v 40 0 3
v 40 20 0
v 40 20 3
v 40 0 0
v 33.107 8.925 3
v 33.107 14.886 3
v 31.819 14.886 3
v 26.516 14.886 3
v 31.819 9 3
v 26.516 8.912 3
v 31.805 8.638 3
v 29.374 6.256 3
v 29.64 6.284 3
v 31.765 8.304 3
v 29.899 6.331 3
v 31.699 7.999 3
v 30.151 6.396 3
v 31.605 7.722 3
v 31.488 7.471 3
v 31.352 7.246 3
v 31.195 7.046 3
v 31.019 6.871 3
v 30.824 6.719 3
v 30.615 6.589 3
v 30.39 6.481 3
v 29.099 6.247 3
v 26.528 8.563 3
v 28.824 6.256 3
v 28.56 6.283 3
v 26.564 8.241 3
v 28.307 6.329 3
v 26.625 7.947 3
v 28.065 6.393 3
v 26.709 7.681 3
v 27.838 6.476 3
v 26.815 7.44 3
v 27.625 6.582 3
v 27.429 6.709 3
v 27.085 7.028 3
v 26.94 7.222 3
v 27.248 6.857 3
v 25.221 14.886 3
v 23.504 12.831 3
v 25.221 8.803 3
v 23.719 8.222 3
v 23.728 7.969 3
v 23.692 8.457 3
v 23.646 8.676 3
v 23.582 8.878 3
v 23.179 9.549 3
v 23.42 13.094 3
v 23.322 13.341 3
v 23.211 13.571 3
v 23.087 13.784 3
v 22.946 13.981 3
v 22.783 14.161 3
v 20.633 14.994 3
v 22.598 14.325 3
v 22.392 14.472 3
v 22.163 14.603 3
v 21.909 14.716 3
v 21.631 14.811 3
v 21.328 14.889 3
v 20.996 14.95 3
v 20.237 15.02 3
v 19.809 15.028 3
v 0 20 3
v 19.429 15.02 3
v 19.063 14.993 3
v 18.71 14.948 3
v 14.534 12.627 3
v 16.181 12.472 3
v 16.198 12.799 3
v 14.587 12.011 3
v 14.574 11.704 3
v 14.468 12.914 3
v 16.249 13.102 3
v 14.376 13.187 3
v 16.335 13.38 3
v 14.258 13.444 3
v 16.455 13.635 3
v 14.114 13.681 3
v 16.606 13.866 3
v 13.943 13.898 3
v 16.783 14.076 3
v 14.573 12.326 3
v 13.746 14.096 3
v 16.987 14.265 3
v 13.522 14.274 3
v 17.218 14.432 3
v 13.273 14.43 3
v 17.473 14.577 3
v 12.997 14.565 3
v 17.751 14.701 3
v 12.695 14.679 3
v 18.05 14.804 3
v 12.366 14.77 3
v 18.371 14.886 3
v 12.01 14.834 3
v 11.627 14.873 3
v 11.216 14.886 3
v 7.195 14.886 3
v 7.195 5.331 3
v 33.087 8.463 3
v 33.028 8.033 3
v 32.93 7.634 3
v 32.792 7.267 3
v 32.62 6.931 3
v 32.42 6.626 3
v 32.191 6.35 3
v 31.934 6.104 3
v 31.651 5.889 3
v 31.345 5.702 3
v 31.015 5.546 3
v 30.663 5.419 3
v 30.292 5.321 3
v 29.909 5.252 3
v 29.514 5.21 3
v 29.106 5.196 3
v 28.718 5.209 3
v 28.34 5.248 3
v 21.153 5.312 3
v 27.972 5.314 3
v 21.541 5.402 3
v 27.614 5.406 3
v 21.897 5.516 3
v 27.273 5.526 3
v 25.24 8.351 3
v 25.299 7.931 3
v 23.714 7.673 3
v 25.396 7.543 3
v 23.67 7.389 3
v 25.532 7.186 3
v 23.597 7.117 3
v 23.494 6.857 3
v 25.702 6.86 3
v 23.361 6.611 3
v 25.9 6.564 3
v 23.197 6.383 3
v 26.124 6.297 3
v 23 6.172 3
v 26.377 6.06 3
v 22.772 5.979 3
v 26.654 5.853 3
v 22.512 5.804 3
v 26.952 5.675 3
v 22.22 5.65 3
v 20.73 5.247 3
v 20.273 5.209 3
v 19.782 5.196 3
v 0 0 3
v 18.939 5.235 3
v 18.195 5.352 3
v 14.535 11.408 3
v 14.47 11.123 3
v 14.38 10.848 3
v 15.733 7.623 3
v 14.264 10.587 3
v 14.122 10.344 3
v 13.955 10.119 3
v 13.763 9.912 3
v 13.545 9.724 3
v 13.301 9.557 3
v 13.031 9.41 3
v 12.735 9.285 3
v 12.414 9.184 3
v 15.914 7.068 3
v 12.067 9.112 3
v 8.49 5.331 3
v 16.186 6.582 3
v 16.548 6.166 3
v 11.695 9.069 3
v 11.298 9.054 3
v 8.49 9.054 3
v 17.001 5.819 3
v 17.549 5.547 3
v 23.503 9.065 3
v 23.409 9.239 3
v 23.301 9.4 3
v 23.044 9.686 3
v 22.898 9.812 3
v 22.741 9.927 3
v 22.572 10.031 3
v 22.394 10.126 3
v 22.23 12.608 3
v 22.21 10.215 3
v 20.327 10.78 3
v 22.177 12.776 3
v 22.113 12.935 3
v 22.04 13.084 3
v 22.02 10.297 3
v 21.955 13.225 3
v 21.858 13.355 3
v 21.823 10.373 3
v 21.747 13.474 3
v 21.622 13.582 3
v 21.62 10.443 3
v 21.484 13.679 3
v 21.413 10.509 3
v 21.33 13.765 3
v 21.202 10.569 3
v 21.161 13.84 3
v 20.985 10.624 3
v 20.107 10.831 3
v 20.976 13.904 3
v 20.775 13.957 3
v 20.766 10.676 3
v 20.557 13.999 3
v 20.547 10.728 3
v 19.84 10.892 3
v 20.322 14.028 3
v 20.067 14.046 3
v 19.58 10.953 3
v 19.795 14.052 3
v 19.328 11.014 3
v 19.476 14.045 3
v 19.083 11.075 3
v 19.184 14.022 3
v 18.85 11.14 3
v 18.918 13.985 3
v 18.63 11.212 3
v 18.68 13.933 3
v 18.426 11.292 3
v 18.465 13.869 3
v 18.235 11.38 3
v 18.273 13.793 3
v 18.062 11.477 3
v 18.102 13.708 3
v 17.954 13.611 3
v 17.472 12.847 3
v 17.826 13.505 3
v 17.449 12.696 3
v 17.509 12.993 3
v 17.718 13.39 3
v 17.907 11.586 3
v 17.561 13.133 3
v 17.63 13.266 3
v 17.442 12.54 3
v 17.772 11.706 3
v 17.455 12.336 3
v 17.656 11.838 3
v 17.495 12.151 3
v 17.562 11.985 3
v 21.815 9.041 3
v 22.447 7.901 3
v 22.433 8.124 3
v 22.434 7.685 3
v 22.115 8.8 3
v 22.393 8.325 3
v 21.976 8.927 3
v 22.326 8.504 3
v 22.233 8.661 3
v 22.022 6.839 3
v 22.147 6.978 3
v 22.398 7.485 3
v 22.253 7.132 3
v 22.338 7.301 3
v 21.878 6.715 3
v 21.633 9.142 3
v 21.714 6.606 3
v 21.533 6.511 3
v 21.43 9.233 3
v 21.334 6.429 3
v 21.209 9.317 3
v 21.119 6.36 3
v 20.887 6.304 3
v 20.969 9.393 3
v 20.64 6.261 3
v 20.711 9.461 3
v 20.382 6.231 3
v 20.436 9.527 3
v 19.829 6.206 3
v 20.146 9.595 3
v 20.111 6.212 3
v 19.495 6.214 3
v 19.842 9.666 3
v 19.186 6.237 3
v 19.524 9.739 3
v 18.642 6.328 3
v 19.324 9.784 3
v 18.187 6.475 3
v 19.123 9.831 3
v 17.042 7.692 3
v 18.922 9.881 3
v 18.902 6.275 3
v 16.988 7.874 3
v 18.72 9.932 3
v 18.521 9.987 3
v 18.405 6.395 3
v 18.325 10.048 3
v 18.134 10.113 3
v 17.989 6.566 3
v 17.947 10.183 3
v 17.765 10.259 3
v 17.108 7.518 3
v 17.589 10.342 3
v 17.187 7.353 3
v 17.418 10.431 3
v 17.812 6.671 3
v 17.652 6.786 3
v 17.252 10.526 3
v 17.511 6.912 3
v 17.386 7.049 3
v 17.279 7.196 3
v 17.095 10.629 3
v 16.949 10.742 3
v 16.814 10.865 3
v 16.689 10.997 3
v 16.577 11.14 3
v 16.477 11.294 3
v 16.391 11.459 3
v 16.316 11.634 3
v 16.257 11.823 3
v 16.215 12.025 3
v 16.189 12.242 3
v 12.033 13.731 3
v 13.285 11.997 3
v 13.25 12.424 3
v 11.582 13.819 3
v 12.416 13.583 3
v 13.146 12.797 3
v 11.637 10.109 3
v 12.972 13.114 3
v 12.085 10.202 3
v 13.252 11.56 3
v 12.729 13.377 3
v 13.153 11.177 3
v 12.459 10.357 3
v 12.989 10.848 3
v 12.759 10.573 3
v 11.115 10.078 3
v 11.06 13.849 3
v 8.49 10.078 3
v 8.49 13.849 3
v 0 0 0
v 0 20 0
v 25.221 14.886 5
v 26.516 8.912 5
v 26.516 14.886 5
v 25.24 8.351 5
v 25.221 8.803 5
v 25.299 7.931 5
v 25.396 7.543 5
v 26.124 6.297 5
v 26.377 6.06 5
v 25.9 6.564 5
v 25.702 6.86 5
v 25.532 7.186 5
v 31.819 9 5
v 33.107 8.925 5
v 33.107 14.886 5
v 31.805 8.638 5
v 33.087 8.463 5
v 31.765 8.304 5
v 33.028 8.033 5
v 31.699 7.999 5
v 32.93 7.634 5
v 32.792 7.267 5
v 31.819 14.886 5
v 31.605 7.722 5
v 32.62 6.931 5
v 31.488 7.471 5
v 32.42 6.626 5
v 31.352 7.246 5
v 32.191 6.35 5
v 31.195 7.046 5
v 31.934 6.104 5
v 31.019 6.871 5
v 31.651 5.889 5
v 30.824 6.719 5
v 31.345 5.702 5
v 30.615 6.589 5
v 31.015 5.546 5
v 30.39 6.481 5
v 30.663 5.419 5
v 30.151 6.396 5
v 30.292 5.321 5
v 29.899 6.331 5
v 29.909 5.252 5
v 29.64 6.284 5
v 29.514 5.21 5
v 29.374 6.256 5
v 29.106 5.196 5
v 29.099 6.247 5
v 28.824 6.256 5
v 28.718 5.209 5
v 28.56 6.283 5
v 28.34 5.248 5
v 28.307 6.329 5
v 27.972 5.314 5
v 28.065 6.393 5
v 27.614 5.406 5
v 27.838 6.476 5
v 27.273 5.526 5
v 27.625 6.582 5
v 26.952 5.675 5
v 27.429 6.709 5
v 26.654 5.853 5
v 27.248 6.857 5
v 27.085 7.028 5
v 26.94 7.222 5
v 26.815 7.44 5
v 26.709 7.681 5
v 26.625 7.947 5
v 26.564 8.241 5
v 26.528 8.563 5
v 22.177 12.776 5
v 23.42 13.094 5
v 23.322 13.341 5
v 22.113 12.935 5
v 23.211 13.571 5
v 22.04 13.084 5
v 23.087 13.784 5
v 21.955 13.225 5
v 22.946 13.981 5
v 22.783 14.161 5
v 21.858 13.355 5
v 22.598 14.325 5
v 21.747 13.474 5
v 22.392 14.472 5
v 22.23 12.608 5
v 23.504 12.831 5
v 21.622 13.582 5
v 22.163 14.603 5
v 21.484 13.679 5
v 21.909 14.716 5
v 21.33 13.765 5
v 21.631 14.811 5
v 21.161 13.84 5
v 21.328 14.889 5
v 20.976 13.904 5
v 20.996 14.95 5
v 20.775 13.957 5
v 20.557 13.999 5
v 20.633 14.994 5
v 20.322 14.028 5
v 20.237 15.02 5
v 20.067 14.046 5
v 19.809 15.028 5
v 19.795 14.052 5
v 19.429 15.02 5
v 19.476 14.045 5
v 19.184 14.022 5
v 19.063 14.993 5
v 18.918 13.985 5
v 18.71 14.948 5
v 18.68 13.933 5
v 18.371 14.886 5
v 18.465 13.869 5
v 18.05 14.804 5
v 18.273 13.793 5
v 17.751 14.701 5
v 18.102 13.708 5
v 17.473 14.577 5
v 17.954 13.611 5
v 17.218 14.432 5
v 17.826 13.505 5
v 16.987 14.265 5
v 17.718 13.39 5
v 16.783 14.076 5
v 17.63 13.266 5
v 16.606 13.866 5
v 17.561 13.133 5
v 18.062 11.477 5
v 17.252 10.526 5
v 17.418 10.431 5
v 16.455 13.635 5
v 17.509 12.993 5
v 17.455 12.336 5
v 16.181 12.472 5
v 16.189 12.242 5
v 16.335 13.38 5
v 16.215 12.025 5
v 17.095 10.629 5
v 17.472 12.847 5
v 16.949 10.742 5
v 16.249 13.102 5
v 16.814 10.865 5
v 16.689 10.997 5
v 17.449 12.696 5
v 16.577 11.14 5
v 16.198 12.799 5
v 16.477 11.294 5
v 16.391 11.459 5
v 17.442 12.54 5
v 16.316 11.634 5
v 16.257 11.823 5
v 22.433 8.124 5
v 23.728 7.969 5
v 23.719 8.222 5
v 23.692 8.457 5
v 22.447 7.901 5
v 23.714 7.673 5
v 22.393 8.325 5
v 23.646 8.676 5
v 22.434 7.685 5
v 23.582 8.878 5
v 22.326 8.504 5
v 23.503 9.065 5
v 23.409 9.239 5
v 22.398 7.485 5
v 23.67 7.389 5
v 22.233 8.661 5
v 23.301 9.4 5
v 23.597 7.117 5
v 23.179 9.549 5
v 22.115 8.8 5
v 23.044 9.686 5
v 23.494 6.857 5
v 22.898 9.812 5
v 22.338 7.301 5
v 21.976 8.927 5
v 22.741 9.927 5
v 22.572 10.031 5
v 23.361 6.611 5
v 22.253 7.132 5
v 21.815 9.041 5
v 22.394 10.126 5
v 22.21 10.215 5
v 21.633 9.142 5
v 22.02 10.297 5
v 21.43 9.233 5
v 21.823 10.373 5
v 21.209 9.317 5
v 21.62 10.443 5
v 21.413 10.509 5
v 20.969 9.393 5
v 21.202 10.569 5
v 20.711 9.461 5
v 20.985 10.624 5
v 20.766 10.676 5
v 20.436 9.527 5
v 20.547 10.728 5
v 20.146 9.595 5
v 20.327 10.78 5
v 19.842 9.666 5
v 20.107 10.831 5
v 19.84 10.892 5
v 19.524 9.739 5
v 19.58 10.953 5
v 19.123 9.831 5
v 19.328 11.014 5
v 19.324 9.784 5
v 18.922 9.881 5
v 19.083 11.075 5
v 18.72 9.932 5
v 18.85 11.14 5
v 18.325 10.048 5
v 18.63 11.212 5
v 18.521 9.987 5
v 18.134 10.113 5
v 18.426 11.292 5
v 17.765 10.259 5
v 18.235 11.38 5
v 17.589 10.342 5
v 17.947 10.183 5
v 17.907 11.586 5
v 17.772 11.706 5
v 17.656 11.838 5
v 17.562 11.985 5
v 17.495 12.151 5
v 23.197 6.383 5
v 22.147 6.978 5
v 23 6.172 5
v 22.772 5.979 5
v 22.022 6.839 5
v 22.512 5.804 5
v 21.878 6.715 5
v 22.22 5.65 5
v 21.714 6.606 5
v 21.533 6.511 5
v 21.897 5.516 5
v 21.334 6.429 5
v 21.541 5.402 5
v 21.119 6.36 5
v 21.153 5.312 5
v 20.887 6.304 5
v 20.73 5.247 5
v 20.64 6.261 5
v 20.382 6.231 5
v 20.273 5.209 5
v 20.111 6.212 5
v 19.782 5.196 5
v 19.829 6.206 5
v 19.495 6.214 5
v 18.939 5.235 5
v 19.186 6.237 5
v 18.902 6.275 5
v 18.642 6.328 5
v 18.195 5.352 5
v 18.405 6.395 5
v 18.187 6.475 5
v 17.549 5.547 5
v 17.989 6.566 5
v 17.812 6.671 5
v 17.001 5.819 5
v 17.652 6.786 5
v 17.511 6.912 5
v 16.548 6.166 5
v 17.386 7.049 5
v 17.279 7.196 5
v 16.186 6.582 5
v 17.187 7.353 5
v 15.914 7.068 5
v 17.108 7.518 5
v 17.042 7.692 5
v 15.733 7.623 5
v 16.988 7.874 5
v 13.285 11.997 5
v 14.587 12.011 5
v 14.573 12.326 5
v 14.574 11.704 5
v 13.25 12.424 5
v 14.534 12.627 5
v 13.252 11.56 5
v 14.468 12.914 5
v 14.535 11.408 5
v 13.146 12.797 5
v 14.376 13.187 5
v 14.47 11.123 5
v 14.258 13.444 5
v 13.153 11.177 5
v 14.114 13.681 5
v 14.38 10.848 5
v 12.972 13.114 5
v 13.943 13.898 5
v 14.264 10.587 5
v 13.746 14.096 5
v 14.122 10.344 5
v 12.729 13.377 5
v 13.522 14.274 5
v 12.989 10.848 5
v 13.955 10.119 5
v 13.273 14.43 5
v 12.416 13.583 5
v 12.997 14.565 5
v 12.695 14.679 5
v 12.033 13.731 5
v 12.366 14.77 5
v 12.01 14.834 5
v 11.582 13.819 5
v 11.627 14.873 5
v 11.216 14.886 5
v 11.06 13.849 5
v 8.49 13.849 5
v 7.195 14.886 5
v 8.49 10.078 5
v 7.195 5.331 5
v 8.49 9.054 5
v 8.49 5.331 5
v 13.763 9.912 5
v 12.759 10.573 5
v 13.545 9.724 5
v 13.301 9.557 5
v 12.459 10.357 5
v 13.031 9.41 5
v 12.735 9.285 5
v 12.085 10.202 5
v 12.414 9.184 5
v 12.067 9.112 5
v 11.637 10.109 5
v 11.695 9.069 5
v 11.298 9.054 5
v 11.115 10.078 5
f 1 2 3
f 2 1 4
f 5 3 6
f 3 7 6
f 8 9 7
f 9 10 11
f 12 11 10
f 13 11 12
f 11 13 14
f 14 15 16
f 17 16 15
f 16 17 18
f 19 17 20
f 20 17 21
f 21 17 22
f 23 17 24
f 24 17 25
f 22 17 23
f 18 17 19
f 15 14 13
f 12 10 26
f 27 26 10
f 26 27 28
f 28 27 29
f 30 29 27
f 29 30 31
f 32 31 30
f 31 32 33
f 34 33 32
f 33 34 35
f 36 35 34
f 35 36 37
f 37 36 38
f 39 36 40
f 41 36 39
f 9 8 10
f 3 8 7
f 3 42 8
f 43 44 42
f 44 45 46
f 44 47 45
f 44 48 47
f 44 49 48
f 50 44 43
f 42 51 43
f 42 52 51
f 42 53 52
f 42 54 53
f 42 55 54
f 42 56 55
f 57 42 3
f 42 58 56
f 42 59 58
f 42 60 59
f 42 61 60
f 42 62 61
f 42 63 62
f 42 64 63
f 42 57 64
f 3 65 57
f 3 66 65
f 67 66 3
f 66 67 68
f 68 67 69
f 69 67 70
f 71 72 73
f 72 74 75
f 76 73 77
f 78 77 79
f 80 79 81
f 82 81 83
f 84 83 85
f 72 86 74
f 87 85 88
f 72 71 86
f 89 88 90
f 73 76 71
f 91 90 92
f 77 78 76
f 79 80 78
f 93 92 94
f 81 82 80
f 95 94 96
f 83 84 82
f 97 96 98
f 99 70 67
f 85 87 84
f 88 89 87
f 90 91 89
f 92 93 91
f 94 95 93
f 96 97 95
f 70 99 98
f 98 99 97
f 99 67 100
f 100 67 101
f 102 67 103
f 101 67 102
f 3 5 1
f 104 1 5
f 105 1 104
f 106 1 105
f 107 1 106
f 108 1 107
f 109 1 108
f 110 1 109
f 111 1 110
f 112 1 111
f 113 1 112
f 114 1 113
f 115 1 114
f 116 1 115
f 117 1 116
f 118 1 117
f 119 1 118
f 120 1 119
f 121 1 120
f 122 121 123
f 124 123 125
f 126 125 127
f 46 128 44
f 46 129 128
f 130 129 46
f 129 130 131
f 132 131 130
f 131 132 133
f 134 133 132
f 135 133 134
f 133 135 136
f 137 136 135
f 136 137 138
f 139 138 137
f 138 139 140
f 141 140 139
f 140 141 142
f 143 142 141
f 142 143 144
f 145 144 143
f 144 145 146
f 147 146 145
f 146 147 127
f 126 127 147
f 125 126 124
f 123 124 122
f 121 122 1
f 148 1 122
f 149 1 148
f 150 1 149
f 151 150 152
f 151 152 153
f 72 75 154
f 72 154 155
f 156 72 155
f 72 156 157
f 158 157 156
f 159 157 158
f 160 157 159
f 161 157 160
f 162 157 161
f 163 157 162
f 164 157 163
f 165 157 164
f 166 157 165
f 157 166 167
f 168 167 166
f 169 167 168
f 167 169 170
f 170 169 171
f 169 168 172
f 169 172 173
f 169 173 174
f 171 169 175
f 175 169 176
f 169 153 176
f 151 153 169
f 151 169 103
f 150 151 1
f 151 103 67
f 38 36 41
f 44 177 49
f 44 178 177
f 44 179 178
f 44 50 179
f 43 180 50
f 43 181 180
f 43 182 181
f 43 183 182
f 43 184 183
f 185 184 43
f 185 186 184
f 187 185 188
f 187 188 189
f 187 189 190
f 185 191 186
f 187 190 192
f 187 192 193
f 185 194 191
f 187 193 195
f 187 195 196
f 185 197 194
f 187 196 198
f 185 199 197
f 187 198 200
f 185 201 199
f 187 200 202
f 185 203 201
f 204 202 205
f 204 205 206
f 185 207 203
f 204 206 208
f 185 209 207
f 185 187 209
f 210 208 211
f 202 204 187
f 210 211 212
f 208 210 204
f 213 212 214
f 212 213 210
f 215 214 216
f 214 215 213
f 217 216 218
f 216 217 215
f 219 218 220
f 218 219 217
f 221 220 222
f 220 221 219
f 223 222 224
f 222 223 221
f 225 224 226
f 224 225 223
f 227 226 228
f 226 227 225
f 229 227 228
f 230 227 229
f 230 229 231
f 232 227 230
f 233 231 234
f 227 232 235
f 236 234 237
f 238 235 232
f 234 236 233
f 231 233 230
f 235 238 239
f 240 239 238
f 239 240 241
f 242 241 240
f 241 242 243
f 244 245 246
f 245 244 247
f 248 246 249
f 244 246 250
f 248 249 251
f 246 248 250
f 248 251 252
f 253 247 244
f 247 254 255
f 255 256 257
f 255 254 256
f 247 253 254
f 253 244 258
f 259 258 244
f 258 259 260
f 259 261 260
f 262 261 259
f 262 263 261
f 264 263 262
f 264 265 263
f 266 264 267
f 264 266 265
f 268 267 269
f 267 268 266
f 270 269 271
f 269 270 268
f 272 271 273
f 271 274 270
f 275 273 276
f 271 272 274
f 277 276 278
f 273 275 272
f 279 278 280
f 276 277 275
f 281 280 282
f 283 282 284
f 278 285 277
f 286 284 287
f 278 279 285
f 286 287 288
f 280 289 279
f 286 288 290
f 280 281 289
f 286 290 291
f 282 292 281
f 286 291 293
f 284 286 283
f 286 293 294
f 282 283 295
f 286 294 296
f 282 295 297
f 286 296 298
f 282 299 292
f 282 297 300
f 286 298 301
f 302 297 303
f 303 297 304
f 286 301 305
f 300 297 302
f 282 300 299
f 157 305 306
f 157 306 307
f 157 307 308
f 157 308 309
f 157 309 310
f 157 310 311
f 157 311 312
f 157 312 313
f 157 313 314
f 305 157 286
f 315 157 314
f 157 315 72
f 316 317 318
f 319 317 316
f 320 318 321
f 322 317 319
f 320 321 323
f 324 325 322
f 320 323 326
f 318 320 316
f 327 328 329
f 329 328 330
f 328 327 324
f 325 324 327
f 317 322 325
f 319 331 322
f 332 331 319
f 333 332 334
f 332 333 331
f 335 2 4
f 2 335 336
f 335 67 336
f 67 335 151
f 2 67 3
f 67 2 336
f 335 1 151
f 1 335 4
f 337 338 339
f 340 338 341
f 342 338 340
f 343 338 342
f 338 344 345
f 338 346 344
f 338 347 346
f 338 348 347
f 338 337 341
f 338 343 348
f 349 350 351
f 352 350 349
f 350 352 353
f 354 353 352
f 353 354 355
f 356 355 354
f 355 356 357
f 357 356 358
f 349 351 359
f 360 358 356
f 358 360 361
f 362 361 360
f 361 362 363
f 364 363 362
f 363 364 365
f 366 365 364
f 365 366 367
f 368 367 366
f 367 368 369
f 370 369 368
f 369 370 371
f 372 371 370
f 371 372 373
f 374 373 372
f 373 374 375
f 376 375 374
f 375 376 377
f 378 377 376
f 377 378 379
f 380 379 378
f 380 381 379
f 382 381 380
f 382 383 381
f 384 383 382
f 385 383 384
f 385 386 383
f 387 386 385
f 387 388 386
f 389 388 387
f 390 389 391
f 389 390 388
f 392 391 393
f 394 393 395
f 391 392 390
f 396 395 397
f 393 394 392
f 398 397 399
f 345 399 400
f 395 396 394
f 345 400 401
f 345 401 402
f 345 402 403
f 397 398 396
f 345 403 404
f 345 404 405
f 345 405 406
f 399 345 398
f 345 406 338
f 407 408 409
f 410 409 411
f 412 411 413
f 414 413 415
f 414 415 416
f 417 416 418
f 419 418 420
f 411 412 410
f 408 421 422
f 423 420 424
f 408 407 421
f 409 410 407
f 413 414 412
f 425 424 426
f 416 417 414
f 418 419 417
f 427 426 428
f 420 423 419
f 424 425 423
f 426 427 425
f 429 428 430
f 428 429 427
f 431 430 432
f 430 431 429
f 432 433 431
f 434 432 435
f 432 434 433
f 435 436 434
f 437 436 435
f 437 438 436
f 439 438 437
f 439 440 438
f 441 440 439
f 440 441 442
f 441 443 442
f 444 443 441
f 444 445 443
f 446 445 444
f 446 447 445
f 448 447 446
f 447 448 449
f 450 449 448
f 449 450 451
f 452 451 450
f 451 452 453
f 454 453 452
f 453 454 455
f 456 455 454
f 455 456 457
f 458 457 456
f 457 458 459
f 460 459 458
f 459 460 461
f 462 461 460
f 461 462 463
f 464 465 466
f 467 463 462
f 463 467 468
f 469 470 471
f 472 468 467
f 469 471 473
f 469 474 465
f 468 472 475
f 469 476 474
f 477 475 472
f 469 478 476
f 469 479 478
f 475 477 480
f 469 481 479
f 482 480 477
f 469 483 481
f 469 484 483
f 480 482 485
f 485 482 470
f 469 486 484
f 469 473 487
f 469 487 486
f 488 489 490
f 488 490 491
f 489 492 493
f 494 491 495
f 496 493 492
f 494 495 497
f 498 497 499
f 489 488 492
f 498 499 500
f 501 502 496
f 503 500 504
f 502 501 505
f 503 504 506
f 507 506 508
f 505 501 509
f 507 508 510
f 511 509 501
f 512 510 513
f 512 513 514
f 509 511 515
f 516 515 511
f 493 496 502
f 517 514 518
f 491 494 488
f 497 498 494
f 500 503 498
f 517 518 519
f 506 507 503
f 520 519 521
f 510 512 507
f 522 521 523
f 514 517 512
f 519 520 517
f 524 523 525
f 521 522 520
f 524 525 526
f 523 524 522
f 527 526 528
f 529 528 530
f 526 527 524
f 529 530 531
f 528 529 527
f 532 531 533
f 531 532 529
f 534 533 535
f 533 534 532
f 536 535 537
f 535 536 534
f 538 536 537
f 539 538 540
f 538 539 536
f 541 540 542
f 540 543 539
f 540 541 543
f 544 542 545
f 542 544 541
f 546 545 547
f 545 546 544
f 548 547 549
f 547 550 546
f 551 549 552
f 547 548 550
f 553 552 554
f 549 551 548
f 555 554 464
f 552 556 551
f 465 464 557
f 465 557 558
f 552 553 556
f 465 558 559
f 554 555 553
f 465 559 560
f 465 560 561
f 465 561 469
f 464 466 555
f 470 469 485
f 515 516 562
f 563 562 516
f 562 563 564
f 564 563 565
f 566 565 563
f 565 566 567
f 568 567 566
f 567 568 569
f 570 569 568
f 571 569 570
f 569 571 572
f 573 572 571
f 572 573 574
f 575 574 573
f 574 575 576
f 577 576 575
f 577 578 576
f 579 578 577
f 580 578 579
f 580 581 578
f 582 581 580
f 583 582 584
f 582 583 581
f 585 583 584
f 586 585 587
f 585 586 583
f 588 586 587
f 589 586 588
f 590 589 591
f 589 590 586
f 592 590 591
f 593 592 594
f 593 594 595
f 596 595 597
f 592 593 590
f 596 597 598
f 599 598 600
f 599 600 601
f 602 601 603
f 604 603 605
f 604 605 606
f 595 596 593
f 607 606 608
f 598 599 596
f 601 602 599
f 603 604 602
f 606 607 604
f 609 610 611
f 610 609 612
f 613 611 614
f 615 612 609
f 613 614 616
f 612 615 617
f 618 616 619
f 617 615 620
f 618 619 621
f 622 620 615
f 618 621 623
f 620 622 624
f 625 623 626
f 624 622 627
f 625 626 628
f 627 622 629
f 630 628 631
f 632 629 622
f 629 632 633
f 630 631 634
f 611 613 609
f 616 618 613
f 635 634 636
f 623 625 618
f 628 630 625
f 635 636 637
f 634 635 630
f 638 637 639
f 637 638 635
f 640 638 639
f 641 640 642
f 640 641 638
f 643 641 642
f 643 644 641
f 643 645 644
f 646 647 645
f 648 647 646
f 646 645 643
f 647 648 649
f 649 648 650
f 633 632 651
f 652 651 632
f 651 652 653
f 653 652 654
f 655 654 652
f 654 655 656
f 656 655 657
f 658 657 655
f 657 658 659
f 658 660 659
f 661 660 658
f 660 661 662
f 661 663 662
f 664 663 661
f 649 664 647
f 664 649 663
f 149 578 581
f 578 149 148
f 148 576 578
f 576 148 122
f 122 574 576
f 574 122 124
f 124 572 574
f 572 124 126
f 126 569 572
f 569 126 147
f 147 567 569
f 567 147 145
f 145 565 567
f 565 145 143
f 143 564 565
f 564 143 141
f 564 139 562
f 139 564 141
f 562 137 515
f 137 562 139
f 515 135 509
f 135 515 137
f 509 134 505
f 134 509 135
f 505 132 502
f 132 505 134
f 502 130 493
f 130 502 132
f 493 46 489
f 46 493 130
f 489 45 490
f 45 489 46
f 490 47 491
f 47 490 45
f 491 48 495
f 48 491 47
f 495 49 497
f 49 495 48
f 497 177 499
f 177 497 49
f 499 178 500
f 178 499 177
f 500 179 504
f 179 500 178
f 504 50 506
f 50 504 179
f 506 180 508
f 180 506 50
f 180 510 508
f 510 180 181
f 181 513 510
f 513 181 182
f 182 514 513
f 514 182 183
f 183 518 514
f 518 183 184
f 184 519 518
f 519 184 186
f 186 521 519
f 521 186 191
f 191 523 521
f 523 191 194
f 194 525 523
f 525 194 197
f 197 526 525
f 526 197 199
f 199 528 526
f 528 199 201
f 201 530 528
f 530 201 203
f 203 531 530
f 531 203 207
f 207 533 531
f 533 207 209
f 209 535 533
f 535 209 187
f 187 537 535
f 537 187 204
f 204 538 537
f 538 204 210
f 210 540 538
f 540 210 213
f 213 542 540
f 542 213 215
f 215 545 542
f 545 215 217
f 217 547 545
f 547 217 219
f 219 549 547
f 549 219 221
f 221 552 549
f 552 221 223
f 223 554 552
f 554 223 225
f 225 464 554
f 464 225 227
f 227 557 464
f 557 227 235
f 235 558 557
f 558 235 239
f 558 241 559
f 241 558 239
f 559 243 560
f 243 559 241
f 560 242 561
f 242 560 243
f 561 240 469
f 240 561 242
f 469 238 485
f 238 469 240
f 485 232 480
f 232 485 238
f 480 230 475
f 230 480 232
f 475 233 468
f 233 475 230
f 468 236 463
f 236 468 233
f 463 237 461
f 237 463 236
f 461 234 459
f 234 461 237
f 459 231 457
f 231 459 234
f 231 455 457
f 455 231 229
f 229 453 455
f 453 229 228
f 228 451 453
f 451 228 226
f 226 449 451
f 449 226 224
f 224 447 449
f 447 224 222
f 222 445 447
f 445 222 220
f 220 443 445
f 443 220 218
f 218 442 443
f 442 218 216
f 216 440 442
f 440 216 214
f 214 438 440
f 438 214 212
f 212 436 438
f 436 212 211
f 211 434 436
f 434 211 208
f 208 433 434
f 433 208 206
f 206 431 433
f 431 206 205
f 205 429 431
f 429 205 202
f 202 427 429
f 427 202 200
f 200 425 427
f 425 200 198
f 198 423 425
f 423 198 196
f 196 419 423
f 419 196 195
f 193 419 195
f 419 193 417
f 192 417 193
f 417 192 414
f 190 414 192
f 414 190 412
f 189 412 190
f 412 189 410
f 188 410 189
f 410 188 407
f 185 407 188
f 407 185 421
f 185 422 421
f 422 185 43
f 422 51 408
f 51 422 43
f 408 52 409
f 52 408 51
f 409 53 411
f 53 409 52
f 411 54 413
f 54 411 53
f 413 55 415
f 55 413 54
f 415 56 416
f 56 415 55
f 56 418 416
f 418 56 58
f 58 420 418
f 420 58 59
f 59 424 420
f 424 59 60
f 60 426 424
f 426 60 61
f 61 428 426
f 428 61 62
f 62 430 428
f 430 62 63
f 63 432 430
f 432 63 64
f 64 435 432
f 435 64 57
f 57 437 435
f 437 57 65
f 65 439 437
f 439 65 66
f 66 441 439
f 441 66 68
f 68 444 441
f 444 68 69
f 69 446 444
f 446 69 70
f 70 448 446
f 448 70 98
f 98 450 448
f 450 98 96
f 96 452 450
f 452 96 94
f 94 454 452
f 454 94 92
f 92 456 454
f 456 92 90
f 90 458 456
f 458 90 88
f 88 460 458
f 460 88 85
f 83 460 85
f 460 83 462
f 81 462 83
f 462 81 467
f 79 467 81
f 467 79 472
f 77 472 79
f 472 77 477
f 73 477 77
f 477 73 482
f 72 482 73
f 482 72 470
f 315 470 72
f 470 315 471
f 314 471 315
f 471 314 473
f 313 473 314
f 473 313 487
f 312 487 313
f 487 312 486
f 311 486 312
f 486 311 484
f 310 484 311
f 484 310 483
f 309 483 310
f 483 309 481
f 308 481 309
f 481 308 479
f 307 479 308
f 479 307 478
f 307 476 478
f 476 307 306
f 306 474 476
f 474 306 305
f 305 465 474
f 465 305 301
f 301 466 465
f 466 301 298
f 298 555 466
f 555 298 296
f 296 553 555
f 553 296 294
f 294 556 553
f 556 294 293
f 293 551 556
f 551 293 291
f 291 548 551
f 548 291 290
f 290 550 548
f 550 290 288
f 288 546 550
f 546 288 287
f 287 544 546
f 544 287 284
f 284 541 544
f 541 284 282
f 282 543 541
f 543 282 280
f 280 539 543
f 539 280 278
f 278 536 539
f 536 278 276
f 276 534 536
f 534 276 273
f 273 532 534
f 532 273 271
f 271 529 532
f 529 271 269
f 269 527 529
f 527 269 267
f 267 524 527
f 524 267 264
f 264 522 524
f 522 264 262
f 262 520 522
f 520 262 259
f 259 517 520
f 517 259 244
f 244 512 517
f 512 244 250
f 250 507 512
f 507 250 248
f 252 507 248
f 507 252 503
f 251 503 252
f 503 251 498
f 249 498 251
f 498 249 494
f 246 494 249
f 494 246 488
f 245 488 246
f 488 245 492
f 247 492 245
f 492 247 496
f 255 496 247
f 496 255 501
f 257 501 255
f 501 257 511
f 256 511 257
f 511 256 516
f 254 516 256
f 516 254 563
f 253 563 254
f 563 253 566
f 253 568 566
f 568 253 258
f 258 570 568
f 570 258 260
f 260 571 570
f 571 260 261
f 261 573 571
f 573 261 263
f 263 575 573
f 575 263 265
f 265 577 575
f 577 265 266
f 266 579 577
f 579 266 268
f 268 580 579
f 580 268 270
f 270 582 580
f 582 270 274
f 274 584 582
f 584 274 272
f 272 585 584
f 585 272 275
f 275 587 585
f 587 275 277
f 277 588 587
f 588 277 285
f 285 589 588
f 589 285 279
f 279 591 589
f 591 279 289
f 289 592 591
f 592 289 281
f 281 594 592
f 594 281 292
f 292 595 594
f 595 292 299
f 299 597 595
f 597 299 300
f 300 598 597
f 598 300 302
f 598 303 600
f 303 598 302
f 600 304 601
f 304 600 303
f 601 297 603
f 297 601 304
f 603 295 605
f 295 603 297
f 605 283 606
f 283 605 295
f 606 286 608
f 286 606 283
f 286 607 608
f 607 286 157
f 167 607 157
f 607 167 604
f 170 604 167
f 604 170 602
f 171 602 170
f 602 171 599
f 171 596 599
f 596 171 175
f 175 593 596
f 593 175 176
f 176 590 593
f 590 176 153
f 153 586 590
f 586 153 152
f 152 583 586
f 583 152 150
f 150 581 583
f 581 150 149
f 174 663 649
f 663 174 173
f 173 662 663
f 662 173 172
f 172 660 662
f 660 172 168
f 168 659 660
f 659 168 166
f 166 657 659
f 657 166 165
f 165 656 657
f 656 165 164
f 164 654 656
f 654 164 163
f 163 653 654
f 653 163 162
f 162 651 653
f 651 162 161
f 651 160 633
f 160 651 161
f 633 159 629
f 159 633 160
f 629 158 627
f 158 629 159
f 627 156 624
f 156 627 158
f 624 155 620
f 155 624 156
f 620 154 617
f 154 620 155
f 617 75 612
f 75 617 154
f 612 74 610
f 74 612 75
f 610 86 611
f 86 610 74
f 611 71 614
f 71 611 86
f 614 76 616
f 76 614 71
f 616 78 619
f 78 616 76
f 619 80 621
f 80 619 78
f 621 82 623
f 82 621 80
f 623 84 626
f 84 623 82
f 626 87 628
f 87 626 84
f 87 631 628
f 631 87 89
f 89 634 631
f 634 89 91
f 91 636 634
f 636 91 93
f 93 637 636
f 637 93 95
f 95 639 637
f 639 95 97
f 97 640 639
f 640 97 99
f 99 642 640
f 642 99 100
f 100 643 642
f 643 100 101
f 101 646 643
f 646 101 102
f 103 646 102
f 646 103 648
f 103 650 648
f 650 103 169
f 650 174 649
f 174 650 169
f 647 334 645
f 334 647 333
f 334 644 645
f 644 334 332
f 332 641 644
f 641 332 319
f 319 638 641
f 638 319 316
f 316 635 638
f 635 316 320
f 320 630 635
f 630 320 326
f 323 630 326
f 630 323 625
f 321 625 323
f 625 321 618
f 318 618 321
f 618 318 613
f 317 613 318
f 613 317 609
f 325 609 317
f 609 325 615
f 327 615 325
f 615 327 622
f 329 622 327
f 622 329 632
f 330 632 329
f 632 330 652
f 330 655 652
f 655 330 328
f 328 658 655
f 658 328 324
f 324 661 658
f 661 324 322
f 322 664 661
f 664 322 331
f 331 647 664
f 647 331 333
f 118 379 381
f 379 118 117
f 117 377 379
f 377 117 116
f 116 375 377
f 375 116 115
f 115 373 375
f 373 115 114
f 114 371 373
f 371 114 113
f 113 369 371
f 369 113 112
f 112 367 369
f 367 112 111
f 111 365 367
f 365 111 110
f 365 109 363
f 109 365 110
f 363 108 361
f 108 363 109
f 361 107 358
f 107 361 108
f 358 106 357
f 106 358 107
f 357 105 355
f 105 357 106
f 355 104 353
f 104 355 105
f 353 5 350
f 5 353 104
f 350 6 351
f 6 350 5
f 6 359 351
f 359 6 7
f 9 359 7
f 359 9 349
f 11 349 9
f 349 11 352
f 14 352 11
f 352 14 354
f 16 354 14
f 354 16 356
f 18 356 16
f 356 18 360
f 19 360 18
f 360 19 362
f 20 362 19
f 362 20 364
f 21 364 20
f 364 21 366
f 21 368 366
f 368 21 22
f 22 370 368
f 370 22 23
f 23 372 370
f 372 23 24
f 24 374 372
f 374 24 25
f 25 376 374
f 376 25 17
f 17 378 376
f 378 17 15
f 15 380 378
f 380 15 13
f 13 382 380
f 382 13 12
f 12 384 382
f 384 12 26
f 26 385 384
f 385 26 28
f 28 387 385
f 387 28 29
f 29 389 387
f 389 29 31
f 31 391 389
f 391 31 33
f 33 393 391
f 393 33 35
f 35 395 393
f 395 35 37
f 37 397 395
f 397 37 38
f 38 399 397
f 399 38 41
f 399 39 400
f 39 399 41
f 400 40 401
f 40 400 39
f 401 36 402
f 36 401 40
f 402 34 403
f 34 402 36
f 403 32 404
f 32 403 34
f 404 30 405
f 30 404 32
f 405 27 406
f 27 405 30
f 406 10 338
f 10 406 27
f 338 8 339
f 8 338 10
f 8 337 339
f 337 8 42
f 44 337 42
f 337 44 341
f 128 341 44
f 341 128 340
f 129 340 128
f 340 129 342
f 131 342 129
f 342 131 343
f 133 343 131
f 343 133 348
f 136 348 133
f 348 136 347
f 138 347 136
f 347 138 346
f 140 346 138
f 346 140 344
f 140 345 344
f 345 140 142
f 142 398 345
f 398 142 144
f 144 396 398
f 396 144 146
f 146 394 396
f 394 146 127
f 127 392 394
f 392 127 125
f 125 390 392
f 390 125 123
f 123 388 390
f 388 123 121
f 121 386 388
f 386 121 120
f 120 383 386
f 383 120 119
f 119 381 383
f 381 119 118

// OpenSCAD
//single line comment
/*
multiline comment
*/

//1. Cube
//cube([40, 25, 5]);
//2. Sphere
//sphere(30);
//3. cylinder
//cylinder(h=5, r=20);

//4. Translate
//translate([10, 10, 10])
//cube([10,10,10]);

//5. Rotate
//rotate([0, 0, 45])
//cube([30,20,5]);

//Combining shapes

//6. Union(combine)
/*
union() {
    cube([20,20,5]);
    translate([5,5,5])
    cylinder(h=10, r=5);
}
*/

//7. Difference (Cut)
/*
difference() {
    cube([30,30,10]);
    translate([15,15,0])
    cylinder(h=10.01, r=5);
}
*/


//8. Intersection (Overlap Only)
/*
intersection() {
    cube([20,20,20]);
    sphere(15);
}
*/

//9. Defining variables
//width = 20;
//length = 10;
//cube([width, length, (width+length)/2]);

//10. 2D shapes
//circle(10);
//square([20,20]);
//text("PSU",10);

//11. Extrude
//linear_extrude(5)
//text("PSU", size=10, halign = "center", valign="center");

//12. Sample nametag
cube([40, 20, 3]);
translate([20, 10, 3])
linear_extrude(2)
text("PSU", size=10,halign = "center", valign="center");

//13. Sample nametag
/*
translate([0, 40, 0])
difference() {
    cube([40,25,5]);
    translate([5,5,3.1])
    linear_extrude(2)
    text("PSU", size=10);
}
*/
